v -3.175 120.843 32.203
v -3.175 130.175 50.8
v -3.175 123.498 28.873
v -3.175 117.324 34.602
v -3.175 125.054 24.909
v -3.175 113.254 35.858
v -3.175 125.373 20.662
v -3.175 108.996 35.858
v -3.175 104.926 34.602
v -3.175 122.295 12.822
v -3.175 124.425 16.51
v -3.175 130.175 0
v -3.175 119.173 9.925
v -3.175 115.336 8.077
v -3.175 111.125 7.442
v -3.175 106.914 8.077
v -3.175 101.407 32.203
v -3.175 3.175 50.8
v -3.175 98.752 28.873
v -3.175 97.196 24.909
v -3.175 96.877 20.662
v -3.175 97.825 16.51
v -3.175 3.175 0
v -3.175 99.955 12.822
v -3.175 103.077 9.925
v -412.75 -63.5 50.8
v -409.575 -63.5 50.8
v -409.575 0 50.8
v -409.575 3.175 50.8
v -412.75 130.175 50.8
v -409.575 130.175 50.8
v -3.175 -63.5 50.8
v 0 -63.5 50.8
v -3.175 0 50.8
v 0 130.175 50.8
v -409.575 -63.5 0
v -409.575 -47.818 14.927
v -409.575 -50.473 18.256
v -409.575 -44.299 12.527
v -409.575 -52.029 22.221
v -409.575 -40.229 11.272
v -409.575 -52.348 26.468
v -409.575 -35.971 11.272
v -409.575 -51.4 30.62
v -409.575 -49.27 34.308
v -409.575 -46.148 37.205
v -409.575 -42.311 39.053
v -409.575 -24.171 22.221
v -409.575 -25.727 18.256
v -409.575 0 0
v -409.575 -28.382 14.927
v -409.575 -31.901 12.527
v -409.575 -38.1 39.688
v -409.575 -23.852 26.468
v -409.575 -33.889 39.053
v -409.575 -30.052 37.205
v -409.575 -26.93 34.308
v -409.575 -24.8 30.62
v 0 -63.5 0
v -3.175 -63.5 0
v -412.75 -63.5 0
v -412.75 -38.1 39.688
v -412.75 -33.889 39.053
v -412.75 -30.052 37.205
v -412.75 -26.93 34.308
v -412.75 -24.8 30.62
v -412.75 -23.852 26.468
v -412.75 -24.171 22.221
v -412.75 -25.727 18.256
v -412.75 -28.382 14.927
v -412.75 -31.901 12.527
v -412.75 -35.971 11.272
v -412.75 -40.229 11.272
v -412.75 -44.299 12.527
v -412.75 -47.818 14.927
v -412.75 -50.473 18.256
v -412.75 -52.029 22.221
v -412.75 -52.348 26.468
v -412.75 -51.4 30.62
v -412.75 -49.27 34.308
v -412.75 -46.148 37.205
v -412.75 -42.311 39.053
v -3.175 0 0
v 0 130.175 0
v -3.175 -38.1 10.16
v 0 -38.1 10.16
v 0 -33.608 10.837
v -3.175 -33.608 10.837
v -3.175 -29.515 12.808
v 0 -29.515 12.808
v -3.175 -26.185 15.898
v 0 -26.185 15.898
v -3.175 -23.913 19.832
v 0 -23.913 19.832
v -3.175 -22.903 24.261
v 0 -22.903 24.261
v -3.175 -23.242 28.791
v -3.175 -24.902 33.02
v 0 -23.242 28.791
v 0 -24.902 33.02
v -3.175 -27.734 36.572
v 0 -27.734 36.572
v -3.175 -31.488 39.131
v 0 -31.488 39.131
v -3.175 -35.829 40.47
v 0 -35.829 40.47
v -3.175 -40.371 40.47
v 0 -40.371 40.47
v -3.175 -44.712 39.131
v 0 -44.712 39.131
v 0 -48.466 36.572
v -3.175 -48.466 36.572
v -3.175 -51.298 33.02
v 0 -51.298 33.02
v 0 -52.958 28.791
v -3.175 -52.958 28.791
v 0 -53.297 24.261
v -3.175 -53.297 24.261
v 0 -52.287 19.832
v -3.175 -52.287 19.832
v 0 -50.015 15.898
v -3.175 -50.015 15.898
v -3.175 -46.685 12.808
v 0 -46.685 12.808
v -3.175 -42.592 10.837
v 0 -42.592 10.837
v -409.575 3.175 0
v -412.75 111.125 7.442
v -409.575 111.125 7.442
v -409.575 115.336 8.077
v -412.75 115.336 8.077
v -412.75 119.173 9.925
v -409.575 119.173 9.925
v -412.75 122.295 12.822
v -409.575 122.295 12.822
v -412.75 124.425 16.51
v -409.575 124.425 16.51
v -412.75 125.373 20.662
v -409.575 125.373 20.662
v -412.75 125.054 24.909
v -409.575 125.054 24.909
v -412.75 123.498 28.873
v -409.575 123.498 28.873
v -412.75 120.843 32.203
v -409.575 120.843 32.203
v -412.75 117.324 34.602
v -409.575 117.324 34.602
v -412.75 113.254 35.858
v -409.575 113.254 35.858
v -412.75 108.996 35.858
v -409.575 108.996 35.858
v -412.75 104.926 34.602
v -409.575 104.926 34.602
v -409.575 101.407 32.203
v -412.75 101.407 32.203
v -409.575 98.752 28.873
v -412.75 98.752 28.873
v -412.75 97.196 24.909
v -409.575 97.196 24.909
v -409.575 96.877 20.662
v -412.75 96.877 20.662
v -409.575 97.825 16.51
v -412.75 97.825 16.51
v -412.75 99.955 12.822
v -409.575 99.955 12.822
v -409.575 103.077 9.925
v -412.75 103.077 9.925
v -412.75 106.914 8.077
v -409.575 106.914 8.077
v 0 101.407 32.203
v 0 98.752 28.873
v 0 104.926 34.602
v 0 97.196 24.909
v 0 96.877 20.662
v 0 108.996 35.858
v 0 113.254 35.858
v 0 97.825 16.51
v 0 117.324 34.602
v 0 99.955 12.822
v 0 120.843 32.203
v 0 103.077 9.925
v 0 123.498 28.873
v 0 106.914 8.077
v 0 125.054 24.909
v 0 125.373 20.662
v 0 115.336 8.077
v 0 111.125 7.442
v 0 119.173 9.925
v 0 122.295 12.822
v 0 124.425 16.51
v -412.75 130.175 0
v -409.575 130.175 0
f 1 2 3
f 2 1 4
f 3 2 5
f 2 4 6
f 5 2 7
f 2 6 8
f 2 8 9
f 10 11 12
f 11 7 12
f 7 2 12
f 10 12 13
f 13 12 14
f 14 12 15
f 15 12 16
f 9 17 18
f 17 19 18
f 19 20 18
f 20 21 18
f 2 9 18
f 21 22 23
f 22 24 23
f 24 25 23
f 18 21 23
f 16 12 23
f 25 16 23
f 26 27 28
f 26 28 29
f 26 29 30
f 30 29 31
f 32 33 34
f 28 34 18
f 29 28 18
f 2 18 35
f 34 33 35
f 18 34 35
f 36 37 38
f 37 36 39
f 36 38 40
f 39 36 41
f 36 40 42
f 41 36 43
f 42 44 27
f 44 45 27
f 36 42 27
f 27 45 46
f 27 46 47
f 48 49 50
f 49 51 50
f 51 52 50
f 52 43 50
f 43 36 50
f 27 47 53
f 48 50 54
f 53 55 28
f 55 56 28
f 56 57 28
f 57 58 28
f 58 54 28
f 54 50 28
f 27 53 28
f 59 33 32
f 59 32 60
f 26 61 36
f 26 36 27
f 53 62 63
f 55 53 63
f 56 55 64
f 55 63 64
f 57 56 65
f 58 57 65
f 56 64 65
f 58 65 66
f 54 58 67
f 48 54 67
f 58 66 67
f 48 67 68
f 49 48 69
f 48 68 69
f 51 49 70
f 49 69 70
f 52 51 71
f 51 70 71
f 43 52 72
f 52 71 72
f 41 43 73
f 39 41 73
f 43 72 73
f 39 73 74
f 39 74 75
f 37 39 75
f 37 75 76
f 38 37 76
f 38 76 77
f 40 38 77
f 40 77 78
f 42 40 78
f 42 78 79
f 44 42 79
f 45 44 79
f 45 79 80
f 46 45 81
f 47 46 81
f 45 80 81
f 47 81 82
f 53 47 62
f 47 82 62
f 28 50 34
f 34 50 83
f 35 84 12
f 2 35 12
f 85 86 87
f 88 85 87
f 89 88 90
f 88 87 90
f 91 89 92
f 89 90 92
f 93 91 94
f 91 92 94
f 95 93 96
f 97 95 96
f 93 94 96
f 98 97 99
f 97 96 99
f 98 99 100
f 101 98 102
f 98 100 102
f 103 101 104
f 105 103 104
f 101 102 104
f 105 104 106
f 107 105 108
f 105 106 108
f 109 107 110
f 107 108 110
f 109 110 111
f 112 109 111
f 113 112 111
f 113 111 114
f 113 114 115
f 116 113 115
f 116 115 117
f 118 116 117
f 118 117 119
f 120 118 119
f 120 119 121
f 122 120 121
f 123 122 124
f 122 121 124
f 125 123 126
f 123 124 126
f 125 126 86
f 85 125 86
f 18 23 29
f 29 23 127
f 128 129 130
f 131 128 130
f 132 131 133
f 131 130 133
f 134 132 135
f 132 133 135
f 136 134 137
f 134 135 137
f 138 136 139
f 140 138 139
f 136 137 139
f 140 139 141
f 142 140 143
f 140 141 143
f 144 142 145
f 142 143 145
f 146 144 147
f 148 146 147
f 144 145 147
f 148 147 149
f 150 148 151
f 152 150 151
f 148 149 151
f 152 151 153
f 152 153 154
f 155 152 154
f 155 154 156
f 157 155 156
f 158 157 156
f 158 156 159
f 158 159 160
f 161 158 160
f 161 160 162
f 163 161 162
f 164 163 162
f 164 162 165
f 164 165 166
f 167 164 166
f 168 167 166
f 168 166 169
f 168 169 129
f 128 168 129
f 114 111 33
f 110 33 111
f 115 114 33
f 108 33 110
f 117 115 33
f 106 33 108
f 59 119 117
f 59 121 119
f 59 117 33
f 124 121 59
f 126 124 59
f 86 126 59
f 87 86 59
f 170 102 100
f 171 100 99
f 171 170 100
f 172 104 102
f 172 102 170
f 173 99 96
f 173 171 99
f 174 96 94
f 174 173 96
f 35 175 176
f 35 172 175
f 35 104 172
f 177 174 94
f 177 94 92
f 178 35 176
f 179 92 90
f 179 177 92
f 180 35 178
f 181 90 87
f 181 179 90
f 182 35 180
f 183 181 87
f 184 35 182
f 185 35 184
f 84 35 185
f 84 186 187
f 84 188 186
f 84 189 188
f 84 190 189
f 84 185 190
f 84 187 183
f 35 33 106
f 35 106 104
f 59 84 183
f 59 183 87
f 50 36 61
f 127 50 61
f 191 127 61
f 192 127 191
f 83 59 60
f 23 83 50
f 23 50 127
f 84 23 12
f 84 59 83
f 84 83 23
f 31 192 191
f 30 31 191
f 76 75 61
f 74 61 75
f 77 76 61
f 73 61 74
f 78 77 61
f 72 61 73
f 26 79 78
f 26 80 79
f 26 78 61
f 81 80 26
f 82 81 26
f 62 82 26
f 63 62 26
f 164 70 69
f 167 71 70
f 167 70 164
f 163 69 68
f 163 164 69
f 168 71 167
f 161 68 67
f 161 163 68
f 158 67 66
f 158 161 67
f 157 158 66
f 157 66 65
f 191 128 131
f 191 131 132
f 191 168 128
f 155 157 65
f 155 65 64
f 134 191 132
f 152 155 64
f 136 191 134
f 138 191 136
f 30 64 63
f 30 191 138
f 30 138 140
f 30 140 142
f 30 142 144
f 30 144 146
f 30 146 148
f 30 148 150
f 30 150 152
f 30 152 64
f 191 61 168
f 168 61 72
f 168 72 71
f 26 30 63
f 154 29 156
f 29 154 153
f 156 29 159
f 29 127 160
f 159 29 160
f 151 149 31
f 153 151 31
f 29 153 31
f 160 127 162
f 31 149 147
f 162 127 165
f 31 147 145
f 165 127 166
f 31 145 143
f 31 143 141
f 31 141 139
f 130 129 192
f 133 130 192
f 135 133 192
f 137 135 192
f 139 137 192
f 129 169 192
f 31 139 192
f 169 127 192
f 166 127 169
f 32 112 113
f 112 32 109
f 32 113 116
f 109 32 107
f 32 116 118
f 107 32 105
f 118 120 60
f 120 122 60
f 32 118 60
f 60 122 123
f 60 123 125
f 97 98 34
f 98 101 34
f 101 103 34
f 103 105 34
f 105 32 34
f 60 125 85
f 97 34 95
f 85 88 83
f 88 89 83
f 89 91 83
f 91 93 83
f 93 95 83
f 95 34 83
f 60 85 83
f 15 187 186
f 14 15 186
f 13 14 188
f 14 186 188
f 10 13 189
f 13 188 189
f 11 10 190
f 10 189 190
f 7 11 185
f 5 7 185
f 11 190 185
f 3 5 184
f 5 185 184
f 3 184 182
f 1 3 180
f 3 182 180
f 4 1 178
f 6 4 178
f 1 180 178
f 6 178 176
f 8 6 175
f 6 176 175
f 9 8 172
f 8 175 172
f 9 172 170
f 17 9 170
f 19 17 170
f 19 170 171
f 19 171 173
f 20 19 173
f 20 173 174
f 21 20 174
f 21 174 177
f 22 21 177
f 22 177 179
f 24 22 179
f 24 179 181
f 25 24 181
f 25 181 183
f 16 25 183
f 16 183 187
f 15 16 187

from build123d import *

# Parameters (mm, degrees)
BOSS_EXTRUDE1_DEPTH = 50.8
SKETCH3_W           = 50.8
SKETCH3_H           = 63.5
SKETCH3_R           = 14.2875
BOSS_EXTRUDE2_DEPTH = 3.175
SKETCH4_W           = 50.8
SKETCH4_H           = 63.5
SKETCH4_R           = 15.24
BOSS_EXTRUDE3_DEPTH = 3.175
SKETCH5_R           = 14.2875
CUT_EXTRUDE1_DEPTH  = 508


with BuildPart() as part:
    # Sketch2 → Boss-Extrude1 (new body)
    with BuildSketch(Plane.XY):
        Polygon((0, 0), (0, 130.175), (-3.175, 130.175), (-3.175, 3.175), (-409.575, 3.175), (-409.575, 130.175), (-412.75, 130.175), (-412.75, 0), align=None)
    extrude(amount=BOSS_EXTRUDE1_DEPTH)

    # Sketch3 → Boss-Extrude2 (add)
    with BuildSketch(Plane.ZY.offset(412.75)):
        with Locations((25.4, -31.75)):
            Rectangle(SKETCH3_W, SKETCH3_H)
        with Locations((25.4, -38.1)):
            Circle(SKETCH3_R, mode=Mode.SUBTRACT)
    extrude(amount=-BOSS_EXTRUDE2_DEPTH)

    # Sketch4 → Boss-Extrude3 (add)
    with BuildSketch(Plane(origin=(0, 0, 0), x_dir=(0, 0, -1), z_dir=(1, 0, 0))):
        with Locations((-25.4, -31.75)):
            Rectangle(SKETCH4_W, SKETCH4_H)
        with Locations((-25.4, -38.1)):
            Circle(SKETCH4_R, mode=Mode.SUBTRACT)
    extrude(amount=-BOSS_EXTRUDE3_DEPTH)

    # Sketch5 → Cut-Extrude1 (cut)
    with BuildSketch(Plane(origin=(0, 0, 0), x_dir=(0, 0, -1), z_dir=(1, 0, 0))):
        with Locations((-21.7297, 111.125)):
            Circle(SKETCH5_R)
    extrude(amount=-CUT_EXTRUDE1_DEPTH, mode=Mode.SUBTRACT)


solid = part.part
